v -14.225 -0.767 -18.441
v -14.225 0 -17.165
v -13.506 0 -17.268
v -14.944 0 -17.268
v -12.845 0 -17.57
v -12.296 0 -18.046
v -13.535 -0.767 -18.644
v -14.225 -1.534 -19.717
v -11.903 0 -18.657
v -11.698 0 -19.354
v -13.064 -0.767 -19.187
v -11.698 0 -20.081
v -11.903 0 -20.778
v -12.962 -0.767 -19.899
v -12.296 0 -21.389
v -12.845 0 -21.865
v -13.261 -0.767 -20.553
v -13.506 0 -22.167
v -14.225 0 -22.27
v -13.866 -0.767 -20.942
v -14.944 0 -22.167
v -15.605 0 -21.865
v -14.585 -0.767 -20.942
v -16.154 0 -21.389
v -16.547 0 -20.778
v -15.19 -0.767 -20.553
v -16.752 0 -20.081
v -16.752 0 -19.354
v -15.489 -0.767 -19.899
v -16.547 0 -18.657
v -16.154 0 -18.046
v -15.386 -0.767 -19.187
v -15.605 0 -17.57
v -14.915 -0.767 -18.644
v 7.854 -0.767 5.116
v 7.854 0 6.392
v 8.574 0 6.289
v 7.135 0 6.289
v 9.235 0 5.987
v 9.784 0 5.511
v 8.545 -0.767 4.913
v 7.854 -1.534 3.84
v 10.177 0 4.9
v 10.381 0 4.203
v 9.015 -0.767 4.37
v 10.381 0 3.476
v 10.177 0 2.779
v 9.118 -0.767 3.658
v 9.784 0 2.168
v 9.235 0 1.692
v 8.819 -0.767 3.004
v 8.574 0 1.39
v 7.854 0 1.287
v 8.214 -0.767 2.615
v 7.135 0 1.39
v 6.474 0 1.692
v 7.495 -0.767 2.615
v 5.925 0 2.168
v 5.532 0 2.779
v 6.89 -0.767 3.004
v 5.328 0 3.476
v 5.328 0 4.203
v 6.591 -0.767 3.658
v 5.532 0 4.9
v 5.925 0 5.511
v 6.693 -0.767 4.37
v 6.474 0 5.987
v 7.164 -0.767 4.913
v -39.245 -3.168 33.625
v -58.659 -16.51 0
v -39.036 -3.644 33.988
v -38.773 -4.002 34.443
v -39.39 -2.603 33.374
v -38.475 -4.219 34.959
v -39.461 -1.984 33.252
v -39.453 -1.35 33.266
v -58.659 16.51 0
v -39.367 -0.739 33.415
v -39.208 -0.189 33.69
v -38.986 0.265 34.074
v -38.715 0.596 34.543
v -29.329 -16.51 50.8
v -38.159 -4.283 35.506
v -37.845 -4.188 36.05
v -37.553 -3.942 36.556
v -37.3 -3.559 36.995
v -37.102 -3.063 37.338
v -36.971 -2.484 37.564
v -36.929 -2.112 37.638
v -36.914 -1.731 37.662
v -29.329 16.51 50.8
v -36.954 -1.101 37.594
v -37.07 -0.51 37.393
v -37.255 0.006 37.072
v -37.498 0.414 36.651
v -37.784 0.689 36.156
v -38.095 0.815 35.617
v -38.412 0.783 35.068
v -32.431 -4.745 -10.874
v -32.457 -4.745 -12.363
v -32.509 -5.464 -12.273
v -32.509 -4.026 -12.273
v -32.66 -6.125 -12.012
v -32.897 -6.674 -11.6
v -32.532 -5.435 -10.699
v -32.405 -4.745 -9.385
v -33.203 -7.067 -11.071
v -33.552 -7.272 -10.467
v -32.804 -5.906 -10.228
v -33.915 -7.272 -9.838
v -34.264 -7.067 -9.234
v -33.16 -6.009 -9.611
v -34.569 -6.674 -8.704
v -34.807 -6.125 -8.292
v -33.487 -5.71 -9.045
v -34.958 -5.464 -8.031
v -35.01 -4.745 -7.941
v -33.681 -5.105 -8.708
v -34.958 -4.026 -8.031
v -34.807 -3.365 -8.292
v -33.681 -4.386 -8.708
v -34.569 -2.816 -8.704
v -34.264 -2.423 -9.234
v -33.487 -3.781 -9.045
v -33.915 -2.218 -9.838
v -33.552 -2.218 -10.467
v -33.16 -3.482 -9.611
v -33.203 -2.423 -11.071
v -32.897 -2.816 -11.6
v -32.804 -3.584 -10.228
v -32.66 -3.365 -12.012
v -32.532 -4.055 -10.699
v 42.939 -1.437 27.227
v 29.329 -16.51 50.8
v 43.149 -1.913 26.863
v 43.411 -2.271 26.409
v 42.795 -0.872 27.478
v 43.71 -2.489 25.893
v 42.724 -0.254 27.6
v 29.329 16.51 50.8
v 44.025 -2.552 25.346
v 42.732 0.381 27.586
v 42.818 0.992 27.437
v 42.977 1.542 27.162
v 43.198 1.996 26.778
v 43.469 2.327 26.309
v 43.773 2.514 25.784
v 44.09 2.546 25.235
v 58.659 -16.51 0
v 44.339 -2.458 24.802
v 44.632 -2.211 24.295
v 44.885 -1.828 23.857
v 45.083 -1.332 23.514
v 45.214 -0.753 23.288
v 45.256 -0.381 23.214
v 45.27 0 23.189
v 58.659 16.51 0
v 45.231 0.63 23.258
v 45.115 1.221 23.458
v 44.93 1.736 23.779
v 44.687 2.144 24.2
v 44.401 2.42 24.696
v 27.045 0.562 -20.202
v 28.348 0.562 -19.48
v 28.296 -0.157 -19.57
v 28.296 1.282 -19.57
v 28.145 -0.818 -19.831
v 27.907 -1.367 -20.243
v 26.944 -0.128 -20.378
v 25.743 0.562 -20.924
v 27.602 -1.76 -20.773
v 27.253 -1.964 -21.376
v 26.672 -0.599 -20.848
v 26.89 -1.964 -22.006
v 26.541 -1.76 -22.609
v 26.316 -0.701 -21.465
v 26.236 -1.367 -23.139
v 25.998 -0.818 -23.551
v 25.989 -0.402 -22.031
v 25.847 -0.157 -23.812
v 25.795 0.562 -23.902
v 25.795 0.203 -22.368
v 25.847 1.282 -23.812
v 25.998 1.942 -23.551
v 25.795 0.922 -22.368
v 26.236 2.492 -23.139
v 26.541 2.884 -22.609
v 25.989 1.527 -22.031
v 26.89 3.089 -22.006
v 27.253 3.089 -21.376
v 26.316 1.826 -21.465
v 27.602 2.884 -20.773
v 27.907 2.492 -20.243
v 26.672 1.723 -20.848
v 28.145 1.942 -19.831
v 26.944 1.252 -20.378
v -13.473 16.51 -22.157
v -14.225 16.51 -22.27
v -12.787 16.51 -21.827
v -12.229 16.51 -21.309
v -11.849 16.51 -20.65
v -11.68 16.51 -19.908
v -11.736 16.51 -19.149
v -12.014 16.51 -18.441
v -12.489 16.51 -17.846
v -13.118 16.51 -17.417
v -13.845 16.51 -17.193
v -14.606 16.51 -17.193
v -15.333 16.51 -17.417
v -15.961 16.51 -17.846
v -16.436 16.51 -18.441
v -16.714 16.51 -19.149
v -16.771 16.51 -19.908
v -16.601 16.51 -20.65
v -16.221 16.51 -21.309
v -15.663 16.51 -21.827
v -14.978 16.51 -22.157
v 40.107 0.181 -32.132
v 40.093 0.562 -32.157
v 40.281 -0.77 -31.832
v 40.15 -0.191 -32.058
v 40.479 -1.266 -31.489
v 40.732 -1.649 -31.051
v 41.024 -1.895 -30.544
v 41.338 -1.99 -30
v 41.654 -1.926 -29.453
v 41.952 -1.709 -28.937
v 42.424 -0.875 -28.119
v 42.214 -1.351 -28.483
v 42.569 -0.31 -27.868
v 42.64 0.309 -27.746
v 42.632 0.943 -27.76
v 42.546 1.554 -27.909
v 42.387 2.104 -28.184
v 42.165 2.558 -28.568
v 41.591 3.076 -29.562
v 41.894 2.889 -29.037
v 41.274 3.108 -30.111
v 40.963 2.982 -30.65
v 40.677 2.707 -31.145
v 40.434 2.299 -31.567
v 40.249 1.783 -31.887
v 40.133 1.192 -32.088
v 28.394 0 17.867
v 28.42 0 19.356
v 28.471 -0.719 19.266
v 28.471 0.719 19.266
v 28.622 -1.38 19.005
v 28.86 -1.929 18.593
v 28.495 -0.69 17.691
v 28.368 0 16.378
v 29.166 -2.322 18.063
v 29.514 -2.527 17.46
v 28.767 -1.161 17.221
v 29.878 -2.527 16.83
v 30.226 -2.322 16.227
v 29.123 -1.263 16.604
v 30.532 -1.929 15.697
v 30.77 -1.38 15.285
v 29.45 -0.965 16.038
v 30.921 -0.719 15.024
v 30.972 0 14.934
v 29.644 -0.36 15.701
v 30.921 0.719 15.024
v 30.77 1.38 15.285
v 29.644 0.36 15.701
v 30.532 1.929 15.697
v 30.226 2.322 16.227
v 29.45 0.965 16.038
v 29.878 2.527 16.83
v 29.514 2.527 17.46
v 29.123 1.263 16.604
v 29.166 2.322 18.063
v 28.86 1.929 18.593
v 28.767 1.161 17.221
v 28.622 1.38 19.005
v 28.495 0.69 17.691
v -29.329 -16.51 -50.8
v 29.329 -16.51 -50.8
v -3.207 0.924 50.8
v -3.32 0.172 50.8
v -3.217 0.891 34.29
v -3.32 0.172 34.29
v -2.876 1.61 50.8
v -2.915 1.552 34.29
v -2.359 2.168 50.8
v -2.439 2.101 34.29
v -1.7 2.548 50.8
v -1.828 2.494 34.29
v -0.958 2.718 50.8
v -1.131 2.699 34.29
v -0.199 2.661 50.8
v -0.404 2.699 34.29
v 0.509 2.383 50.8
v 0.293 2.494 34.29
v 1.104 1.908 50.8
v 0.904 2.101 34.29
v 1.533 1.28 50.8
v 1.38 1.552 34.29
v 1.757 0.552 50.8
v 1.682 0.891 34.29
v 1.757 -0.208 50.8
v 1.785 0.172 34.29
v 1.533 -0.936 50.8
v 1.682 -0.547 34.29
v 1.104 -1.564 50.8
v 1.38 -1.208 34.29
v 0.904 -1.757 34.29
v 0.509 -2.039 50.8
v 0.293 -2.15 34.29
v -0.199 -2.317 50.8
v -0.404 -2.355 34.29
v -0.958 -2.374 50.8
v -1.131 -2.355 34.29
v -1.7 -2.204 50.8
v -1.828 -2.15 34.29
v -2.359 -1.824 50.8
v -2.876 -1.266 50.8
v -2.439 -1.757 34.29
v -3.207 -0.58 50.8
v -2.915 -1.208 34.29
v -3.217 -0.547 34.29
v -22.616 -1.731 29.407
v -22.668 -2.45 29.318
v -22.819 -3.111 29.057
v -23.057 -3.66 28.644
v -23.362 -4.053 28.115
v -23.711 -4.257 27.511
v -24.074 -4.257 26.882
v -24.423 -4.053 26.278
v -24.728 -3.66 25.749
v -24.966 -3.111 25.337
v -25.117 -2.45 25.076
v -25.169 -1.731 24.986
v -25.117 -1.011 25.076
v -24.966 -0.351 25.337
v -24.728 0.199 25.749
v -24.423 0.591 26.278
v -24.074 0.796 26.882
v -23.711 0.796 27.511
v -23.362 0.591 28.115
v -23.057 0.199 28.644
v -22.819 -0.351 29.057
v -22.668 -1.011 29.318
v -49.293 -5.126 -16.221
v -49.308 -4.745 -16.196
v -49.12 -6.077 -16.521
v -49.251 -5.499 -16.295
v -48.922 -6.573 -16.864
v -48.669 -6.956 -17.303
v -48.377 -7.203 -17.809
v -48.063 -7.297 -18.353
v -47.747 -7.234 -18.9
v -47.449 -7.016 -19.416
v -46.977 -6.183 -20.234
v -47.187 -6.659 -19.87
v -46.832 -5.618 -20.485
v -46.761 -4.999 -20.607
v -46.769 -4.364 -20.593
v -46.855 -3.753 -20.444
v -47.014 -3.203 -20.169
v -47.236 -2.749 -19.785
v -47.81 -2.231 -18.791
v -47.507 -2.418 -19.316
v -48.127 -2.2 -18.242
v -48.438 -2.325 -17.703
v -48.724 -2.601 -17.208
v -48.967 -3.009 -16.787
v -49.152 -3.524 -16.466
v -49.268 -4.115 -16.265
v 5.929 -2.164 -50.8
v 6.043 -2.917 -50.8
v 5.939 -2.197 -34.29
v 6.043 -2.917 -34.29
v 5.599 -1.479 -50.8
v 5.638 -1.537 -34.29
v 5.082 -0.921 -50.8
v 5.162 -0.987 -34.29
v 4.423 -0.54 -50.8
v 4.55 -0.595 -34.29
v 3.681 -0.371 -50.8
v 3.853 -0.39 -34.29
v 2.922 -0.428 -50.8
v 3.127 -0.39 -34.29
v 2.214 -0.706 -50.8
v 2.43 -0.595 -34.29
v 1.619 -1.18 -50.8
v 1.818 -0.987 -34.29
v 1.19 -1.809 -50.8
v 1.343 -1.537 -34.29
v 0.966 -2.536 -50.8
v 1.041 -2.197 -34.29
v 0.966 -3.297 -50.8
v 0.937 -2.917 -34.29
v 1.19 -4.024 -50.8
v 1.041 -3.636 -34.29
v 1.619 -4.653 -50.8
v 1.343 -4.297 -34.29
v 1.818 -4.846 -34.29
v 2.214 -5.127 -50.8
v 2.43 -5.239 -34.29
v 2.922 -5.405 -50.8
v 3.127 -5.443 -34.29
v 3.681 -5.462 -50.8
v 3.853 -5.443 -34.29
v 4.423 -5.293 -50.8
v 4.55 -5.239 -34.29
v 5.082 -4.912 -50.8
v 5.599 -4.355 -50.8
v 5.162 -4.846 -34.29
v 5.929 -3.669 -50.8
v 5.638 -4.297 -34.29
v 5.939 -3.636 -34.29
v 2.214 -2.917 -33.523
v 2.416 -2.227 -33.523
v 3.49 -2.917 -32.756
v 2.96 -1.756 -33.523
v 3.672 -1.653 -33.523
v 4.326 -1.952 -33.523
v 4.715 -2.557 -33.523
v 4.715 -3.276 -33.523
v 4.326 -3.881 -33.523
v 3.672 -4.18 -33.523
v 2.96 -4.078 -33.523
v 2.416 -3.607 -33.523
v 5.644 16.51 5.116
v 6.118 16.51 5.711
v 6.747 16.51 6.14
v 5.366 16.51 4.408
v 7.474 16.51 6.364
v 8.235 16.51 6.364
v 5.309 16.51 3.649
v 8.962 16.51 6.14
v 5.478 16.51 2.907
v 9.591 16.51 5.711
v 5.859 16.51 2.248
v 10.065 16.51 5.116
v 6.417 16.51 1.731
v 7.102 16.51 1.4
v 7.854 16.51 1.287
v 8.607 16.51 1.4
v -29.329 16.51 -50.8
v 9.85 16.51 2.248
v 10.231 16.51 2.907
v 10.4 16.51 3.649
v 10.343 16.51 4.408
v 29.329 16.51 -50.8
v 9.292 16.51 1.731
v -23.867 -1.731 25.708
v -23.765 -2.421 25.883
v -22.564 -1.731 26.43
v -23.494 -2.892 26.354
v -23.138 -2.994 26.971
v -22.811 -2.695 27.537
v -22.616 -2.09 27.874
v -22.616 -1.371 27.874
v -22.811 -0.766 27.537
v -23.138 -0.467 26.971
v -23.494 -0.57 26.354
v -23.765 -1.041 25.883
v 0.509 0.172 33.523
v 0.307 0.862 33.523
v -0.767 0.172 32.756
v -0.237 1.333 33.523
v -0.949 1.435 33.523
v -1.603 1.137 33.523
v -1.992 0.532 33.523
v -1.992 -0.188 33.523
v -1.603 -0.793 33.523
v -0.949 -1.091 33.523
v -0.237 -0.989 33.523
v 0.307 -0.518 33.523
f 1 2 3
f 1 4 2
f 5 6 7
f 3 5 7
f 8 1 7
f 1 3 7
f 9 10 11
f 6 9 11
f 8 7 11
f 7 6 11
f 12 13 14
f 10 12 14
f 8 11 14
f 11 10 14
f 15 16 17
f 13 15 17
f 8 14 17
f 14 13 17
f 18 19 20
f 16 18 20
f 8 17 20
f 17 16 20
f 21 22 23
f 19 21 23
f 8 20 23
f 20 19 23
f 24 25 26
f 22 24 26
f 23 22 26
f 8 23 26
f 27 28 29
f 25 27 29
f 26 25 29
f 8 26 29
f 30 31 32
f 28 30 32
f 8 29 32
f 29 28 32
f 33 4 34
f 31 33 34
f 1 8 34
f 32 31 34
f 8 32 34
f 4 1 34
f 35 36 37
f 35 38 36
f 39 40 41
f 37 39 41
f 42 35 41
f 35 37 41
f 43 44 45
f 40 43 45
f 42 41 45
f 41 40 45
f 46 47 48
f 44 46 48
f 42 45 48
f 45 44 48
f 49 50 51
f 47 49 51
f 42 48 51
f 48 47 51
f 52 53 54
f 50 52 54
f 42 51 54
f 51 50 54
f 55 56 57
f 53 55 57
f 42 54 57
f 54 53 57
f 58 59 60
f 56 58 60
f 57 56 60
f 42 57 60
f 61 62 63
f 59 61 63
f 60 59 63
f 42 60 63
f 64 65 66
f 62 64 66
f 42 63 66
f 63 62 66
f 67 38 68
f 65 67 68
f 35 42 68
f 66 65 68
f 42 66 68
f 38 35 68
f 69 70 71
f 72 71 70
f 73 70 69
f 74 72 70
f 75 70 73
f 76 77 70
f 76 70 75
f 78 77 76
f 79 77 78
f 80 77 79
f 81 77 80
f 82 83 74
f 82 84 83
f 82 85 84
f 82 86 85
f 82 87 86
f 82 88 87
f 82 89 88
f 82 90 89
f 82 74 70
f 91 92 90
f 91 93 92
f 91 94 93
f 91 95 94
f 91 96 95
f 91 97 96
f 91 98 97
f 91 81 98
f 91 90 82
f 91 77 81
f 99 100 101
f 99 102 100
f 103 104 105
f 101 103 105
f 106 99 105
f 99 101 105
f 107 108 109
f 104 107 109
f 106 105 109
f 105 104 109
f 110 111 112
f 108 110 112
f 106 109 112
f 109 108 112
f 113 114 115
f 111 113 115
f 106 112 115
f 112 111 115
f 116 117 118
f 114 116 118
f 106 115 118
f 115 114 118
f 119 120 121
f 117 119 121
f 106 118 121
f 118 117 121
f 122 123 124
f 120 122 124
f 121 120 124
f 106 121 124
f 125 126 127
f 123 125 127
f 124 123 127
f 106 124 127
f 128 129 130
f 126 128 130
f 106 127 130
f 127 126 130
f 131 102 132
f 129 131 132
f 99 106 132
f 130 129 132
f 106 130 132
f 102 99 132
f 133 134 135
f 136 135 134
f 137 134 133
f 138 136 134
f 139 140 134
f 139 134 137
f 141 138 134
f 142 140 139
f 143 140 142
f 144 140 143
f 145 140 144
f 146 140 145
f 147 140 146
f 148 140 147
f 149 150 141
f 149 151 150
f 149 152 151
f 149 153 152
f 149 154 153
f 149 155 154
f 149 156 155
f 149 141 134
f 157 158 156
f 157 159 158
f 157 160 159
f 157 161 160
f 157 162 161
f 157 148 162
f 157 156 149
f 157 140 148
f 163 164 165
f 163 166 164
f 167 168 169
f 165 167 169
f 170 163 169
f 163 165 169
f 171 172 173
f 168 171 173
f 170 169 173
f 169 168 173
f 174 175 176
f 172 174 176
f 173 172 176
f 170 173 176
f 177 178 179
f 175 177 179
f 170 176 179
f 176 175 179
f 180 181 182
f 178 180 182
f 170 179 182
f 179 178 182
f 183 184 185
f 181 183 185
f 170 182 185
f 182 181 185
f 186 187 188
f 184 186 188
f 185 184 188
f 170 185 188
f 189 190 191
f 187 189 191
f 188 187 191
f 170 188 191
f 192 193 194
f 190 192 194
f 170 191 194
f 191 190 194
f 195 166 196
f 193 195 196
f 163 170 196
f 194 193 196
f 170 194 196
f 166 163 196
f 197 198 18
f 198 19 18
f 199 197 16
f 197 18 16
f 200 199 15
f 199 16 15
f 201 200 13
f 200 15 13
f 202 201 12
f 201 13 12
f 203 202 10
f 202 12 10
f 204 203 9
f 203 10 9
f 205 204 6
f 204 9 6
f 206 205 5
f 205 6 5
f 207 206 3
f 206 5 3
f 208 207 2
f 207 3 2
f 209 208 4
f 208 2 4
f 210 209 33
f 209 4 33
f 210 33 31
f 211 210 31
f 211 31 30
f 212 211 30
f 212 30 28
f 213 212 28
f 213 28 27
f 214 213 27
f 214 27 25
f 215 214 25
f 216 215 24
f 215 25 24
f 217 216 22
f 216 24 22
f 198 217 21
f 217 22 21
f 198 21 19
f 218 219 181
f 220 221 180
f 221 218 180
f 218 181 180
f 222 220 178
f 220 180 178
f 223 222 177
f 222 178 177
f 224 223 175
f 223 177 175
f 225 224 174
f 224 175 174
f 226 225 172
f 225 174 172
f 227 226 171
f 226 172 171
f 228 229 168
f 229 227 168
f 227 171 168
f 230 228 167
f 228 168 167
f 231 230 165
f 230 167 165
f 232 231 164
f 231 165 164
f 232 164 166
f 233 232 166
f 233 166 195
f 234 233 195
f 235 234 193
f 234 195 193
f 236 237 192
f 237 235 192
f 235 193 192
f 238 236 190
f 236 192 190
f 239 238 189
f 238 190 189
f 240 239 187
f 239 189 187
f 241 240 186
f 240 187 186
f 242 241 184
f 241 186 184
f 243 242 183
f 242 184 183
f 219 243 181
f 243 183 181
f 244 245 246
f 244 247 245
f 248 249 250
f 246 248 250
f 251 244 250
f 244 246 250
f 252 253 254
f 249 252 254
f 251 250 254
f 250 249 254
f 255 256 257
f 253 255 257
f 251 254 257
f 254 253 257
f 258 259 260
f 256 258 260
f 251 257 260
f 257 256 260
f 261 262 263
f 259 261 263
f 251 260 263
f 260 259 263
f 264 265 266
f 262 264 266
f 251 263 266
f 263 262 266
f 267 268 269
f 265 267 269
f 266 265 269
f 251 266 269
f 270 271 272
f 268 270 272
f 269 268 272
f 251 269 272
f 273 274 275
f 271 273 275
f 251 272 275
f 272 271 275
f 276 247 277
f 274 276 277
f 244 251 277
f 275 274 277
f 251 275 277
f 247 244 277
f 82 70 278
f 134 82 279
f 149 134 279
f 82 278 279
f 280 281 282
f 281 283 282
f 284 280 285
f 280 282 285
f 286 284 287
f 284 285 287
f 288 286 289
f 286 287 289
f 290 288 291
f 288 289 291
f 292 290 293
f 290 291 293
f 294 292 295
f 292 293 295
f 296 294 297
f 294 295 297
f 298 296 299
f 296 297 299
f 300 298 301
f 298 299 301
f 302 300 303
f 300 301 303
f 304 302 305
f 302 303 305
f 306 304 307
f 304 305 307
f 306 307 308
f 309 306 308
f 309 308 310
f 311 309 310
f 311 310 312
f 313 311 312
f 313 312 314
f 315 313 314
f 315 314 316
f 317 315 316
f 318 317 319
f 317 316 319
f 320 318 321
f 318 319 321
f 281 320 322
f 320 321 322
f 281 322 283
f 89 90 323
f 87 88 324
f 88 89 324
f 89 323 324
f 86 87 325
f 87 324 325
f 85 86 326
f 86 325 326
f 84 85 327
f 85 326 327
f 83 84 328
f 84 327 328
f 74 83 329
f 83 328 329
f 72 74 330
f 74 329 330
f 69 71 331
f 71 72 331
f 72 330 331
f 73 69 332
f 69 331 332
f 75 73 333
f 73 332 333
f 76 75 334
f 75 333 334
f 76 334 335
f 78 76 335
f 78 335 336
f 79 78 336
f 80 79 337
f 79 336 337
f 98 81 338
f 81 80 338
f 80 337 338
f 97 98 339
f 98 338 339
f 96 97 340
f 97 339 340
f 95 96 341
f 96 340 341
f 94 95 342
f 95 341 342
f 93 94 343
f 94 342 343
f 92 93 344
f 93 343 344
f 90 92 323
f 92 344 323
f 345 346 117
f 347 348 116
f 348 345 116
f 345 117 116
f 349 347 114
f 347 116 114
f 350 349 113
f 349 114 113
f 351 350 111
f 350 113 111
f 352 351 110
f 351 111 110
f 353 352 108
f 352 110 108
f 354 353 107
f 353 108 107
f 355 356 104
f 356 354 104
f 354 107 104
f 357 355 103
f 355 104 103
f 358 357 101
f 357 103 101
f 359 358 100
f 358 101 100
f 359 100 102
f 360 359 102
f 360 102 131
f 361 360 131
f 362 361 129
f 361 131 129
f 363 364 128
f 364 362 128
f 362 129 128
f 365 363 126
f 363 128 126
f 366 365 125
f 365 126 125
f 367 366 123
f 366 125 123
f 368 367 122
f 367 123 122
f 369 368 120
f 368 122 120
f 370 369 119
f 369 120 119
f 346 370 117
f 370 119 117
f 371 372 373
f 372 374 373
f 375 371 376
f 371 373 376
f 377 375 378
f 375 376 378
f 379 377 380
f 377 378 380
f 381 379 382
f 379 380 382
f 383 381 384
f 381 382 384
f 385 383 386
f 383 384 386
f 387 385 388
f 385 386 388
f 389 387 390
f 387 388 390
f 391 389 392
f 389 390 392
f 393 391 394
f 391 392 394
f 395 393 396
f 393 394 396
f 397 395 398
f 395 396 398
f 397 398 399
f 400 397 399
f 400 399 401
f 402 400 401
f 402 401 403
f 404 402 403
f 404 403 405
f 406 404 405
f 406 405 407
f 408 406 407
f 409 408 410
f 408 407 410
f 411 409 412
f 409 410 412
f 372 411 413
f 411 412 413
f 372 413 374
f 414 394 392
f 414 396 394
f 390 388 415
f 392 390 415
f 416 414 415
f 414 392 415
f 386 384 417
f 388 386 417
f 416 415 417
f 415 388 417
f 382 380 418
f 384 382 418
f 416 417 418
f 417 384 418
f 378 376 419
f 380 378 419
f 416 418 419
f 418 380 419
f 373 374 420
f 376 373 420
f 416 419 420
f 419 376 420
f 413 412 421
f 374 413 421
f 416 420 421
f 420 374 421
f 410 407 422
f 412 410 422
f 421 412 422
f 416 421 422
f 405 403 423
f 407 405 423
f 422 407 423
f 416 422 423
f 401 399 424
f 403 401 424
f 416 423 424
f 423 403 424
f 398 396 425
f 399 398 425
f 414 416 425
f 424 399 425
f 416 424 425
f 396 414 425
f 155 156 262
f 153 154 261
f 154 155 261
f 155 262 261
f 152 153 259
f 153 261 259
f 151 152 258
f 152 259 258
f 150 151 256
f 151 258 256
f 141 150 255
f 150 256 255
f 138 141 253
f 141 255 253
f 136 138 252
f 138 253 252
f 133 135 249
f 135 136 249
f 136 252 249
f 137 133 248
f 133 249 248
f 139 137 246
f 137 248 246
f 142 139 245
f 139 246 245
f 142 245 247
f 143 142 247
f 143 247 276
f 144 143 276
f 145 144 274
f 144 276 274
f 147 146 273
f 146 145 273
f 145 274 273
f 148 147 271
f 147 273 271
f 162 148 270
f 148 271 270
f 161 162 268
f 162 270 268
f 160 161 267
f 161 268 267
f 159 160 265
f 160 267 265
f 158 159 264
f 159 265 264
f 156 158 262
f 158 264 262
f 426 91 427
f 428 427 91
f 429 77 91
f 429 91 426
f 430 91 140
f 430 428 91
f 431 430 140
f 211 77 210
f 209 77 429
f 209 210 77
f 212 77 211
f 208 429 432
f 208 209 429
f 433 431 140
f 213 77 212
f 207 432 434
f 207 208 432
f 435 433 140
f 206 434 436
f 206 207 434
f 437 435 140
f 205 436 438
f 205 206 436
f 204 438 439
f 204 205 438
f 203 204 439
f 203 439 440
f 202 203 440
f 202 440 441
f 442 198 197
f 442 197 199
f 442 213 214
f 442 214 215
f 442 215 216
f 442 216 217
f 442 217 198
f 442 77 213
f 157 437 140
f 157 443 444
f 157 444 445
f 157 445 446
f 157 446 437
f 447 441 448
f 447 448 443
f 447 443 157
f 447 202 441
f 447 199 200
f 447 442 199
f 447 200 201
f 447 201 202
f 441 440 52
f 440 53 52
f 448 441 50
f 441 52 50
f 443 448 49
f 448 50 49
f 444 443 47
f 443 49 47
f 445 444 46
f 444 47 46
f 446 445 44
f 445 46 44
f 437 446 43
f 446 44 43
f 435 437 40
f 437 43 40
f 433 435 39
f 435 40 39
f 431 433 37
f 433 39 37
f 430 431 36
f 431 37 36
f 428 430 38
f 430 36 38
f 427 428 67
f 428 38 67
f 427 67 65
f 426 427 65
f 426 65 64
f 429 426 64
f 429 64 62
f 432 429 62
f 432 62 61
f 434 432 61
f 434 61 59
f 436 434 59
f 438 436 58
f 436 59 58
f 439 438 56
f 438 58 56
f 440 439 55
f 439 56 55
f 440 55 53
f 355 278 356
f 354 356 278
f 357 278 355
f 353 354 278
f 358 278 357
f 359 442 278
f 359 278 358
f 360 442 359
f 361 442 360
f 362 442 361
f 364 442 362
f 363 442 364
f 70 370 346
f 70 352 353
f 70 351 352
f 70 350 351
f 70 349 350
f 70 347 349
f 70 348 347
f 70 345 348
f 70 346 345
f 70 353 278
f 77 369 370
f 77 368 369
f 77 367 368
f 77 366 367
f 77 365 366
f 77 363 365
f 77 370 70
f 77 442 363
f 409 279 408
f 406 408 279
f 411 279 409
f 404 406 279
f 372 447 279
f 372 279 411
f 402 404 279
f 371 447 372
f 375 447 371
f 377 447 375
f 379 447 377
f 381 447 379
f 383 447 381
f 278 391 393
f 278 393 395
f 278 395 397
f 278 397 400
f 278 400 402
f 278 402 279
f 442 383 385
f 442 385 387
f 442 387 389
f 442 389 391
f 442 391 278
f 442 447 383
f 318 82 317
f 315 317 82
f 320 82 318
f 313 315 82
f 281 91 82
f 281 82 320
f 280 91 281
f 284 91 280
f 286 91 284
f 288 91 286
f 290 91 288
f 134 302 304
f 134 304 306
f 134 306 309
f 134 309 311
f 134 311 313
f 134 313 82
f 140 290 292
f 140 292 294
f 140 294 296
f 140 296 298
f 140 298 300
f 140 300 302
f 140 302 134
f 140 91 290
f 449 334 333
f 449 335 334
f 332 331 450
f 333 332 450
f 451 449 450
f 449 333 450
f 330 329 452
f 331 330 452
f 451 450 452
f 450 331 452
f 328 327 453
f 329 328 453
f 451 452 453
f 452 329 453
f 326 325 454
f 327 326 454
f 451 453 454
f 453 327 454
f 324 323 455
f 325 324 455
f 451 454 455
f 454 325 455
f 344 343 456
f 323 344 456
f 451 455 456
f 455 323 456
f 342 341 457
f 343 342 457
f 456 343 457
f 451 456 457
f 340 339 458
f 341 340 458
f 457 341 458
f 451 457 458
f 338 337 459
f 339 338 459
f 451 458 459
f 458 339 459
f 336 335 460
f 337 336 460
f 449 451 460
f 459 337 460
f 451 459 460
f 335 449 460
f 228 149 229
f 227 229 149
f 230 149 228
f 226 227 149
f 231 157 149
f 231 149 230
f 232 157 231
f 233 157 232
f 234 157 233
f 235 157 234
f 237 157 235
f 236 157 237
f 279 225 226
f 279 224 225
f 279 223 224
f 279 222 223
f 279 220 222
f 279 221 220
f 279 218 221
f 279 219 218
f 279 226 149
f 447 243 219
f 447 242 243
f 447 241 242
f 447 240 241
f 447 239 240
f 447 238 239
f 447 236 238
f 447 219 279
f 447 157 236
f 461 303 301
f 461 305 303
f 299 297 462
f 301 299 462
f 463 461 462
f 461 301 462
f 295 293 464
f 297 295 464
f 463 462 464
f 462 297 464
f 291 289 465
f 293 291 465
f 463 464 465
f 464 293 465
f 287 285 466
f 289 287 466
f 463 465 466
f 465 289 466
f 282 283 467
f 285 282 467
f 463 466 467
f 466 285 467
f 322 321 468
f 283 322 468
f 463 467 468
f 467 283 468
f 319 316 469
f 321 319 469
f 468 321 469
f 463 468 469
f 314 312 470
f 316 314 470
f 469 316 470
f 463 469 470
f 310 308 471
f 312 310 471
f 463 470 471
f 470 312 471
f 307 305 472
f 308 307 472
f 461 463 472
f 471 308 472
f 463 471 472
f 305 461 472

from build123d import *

# Parameters (mm, degrees)
BOSS_EXTRUDE1_DEPTH                   = 16.51
F_1_4_20_TAPPED_HOLE2_D               = 5.1054
F_1_4_20_TAPPED_HOLE2_DEPTH           = 16.51
F_1_4_20_TAPPED_HOLE2_TIP             = 1.533816902
F_1_4_20_TAPPED_HOLE2_ON_FACE_2_D     = 5.1054
F_1_4_20_TAPPED_HOLE2_ON_FACE_2_DEPTH = 16.51
F_1_4_20_TAPPED_HOLE2_ON_FACE_2_TIP   = 1.533816902
F_1_4_20_TAPPED_HOLE2_ON_FACE_3_D     = 5.1054
F_1_4_20_TAPPED_HOLE2_ON_FACE_3_DEPTH = 16.51
F_1_4_20_TAPPED_HOLE2_ON_FACE_3_TIP   = 1.533816902
F_1_4_20_TAPPED_HOLE2_ON_FACE_4_D     = 5.1054
F_1_4_20_TAPPED_HOLE2_ON_FACE_4_DEPTH = 16.51
F_1_4_20_TAPPED_HOLE2_ON_FACE_4_TIP   = 1.533816902
F_1_4_20_TAPPED_HOLE2_ON_FACE_5_D     = 5.1054
F_1_4_20_TAPPED_HOLE2_ON_FACE_5_DEPTH = 16.51
F_1_4_20_TAPPED_HOLE2_ON_FACE_5_TIP   = 1.533816902
F_1_4_20_TAPPED_HOLE2_ON_FACE_6_D     = 5.1054
F_1_4_20_TAPPED_HOLE2_ON_FACE_6_DEPTH = 16.51
F_1_4_20_TAPPED_HOLE2_ON_FACE_6_TIP   = 1.533816902
F_1_4_20_TAPPED_HOLE2_ON_FACE_7_D     = 5.1054
F_1_4_20_TAPPED_HOLE2_ON_FACE_7_DEPTH = 16.51
F_1_4_20_TAPPED_HOLE2_ON_FACE_7_TIP   = 1.533816902


with BuildPart() as part:
    # Sketch1 → Boss-Extrude1 (new, symmetric)
    with BuildSketch(Plane(origin=(0, 0, 0), x_dir=(1, 0, 0), z_dir=(0, 1, 0))):
        Polygon((-58.65878735, 0), (-29.329393675, -50.8), (29.329393675, -50.8), (58.65878735, 0), (29.329393675, 50.8), (-29.329393675, 50.8), align=None)
    extrude(amount=BOSS_EXTRUDE1_DEPTH, both=True)

    # 1/4-20 Tapped Hole2
    with Locations(Plane(origin=(-14.225163033, 16.51, -19.717380526), x_dir=(0, 0, 1), z_dir=(0, 1, 0))):
        with Locations((0, 0), (23.5570377, 22.079652882)):
            Hole(F_1_4_20_TAPPED_HOLE2_D / 2, depth=F_1_4_20_TAPPED_HOLE2_DEPTH)
            with Locations((0, 0, -(F_1_4_20_TAPPED_HOLE2_DEPTH + F_1_4_20_TAPPED_HOLE2_TIP / 2))):  # 118° drill point
                Cone(0, F_1_4_20_TAPPED_HOLE2_D / 2, F_1_4_20_TAPPED_HOLE2_TIP, mode=Mode.SUBTRACT)

    # 1/4-20 Tapped Hole2 on face 2
    with Locations(Plane(origin=(41.36951867, 0.562395416, -29.945891779), x_dir=(0.500000174844, 0, 0.866025302838), z_dir=(0.866025302838, 0, -0.500000174844))):
        with Locations((0, 0)):
            Hole(F_1_4_20_TAPPED_HOLE2_ON_FACE_2_D / 2, depth=F_1_4_20_TAPPED_HOLE2_ON_FACE_2_DEPTH)
            with Locations((0, 0, -(F_1_4_20_TAPPED_HOLE2_ON_FACE_2_DEPTH + F_1_4_20_TAPPED_HOLE2_ON_FACE_2_TIP / 2))):  # 118° drill point
                Cone(0, F_1_4_20_TAPPED_HOLE2_ON_FACE_2_D / 2, F_1_4_20_TAPPED_HOLE2_ON_FACE_2_TIP, mode=Mode.SUBTRACT)

    # 1/4-20 Tapped Hole2 on face 3
    with Locations(Plane(origin=(43.994090512, 0, 25.4), x_dir=(-0.500000174844, 0, 0.866025302838), z_dir=(0.866025302838, 0, 0.500000174844))):
        with Locations((0, 0)):
            Hole(F_1_4_20_TAPPED_HOLE2_ON_FACE_3_D / 2, depth=F_1_4_20_TAPPED_HOLE2_ON_FACE_3_DEPTH)
            with Locations((0, 0, -(F_1_4_20_TAPPED_HOLE2_ON_FACE_3_DEPTH + F_1_4_20_TAPPED_HOLE2_ON_FACE_3_TIP / 2))):  # 118° drill point
                Cone(0, F_1_4_20_TAPPED_HOLE2_ON_FACE_3_D / 2, F_1_4_20_TAPPED_HOLE2_ON_FACE_3_TIP, mode=Mode.SUBTRACT)

    # 1/4-20 Tapped Hole2 on face 4
    with Locations(Plane(origin=(-0.767217268, 0.17198146, 50.8), x_dir=(1, 0, 0), z_dir=(0, 0, 1))):
        with Locations((0, 0)):
            Hole(F_1_4_20_TAPPED_HOLE2_ON_FACE_4_D / 2, depth=F_1_4_20_TAPPED_HOLE2_ON_FACE_4_DEPTH)
            with Locations((0, 0, -(F_1_4_20_TAPPED_HOLE2_ON_FACE_4_DEPTH + F_1_4_20_TAPPED_HOLE2_ON_FACE_4_TIP / 2))):  # 118° drill point
                Cone(0, F_1_4_20_TAPPED_HOLE2_ON_FACE_4_D / 2, F_1_4_20_TAPPED_HOLE2_ON_FACE_4_TIP, mode=Mode.SUBTRACT)

    # 1/4-20 Tapped Hole2 on face 5
    with Locations(Plane(origin=(-38.190702716, -1.730660851, 35.451762519), x_dir=(-0.500000174844, 0, -0.866025302838), z_dir=(-0.866025302838, 0, 0.500000174844))):
        with Locations((0, 0)):
            Hole(F_1_4_20_TAPPED_HOLE2_ON_FACE_5_D / 2, depth=F_1_4_20_TAPPED_HOLE2_ON_FACE_5_DEPTH)
            with Locations((0, 0, -(F_1_4_20_TAPPED_HOLE2_ON_FACE_5_DEPTH + F_1_4_20_TAPPED_HOLE2_ON_FACE_5_TIP / 2))):  # 118° drill point
                Cone(0, F_1_4_20_TAPPED_HOLE2_ON_FACE_5_D / 2, F_1_4_20_TAPPED_HOLE2_ON_FACE_5_TIP, mode=Mode.SUBTRACT)

    # 1/4-20 Tapped Hole2 on face 6
    with Locations(Plane(origin=(-48.031402305, -4.745159271, -18.407170849), x_dir=(0.500000174844, 0, -0.866025302838), z_dir=(-0.866025302838, 0, -0.500000174844))):
        with Locations((0, 0)):
            Hole(F_1_4_20_TAPPED_HOLE2_ON_FACE_6_D / 2, depth=F_1_4_20_TAPPED_HOLE2_ON_FACE_6_DEPTH)
            with Locations((0, 0, -(F_1_4_20_TAPPED_HOLE2_ON_FACE_6_DEPTH + F_1_4_20_TAPPED_HOLE2_ON_FACE_6_TIP / 2))):  # 118° drill point
                Cone(0, F_1_4_20_TAPPED_HOLE2_ON_FACE_6_D / 2, F_1_4_20_TAPPED_HOLE2_ON_FACE_6_TIP, mode=Mode.SUBTRACT)

    # 1/4-20 Tapped Hole2 on face 7
    with Locations(Plane(origin=(3.490061769, -2.916627308, -50.8), x_dir=(-1, 0, 0), z_dir=(0, 0, -1))):
        with Locations((0, 0)):
            Hole(F_1_4_20_TAPPED_HOLE2_ON_FACE_7_D / 2, depth=F_1_4_20_TAPPED_HOLE2_ON_FACE_7_DEPTH)
            with Locations((0, 0, -(F_1_4_20_TAPPED_HOLE2_ON_FACE_7_DEPTH + F_1_4_20_TAPPED_HOLE2_ON_FACE_7_TIP / 2))):  # 118° drill point
                Cone(0, F_1_4_20_TAPPED_HOLE2_ON_FACE_7_D / 2, F_1_4_20_TAPPED_HOLE2_ON_FACE_7_TIP, mode=Mode.SUBTRACT)


solid = part.part
